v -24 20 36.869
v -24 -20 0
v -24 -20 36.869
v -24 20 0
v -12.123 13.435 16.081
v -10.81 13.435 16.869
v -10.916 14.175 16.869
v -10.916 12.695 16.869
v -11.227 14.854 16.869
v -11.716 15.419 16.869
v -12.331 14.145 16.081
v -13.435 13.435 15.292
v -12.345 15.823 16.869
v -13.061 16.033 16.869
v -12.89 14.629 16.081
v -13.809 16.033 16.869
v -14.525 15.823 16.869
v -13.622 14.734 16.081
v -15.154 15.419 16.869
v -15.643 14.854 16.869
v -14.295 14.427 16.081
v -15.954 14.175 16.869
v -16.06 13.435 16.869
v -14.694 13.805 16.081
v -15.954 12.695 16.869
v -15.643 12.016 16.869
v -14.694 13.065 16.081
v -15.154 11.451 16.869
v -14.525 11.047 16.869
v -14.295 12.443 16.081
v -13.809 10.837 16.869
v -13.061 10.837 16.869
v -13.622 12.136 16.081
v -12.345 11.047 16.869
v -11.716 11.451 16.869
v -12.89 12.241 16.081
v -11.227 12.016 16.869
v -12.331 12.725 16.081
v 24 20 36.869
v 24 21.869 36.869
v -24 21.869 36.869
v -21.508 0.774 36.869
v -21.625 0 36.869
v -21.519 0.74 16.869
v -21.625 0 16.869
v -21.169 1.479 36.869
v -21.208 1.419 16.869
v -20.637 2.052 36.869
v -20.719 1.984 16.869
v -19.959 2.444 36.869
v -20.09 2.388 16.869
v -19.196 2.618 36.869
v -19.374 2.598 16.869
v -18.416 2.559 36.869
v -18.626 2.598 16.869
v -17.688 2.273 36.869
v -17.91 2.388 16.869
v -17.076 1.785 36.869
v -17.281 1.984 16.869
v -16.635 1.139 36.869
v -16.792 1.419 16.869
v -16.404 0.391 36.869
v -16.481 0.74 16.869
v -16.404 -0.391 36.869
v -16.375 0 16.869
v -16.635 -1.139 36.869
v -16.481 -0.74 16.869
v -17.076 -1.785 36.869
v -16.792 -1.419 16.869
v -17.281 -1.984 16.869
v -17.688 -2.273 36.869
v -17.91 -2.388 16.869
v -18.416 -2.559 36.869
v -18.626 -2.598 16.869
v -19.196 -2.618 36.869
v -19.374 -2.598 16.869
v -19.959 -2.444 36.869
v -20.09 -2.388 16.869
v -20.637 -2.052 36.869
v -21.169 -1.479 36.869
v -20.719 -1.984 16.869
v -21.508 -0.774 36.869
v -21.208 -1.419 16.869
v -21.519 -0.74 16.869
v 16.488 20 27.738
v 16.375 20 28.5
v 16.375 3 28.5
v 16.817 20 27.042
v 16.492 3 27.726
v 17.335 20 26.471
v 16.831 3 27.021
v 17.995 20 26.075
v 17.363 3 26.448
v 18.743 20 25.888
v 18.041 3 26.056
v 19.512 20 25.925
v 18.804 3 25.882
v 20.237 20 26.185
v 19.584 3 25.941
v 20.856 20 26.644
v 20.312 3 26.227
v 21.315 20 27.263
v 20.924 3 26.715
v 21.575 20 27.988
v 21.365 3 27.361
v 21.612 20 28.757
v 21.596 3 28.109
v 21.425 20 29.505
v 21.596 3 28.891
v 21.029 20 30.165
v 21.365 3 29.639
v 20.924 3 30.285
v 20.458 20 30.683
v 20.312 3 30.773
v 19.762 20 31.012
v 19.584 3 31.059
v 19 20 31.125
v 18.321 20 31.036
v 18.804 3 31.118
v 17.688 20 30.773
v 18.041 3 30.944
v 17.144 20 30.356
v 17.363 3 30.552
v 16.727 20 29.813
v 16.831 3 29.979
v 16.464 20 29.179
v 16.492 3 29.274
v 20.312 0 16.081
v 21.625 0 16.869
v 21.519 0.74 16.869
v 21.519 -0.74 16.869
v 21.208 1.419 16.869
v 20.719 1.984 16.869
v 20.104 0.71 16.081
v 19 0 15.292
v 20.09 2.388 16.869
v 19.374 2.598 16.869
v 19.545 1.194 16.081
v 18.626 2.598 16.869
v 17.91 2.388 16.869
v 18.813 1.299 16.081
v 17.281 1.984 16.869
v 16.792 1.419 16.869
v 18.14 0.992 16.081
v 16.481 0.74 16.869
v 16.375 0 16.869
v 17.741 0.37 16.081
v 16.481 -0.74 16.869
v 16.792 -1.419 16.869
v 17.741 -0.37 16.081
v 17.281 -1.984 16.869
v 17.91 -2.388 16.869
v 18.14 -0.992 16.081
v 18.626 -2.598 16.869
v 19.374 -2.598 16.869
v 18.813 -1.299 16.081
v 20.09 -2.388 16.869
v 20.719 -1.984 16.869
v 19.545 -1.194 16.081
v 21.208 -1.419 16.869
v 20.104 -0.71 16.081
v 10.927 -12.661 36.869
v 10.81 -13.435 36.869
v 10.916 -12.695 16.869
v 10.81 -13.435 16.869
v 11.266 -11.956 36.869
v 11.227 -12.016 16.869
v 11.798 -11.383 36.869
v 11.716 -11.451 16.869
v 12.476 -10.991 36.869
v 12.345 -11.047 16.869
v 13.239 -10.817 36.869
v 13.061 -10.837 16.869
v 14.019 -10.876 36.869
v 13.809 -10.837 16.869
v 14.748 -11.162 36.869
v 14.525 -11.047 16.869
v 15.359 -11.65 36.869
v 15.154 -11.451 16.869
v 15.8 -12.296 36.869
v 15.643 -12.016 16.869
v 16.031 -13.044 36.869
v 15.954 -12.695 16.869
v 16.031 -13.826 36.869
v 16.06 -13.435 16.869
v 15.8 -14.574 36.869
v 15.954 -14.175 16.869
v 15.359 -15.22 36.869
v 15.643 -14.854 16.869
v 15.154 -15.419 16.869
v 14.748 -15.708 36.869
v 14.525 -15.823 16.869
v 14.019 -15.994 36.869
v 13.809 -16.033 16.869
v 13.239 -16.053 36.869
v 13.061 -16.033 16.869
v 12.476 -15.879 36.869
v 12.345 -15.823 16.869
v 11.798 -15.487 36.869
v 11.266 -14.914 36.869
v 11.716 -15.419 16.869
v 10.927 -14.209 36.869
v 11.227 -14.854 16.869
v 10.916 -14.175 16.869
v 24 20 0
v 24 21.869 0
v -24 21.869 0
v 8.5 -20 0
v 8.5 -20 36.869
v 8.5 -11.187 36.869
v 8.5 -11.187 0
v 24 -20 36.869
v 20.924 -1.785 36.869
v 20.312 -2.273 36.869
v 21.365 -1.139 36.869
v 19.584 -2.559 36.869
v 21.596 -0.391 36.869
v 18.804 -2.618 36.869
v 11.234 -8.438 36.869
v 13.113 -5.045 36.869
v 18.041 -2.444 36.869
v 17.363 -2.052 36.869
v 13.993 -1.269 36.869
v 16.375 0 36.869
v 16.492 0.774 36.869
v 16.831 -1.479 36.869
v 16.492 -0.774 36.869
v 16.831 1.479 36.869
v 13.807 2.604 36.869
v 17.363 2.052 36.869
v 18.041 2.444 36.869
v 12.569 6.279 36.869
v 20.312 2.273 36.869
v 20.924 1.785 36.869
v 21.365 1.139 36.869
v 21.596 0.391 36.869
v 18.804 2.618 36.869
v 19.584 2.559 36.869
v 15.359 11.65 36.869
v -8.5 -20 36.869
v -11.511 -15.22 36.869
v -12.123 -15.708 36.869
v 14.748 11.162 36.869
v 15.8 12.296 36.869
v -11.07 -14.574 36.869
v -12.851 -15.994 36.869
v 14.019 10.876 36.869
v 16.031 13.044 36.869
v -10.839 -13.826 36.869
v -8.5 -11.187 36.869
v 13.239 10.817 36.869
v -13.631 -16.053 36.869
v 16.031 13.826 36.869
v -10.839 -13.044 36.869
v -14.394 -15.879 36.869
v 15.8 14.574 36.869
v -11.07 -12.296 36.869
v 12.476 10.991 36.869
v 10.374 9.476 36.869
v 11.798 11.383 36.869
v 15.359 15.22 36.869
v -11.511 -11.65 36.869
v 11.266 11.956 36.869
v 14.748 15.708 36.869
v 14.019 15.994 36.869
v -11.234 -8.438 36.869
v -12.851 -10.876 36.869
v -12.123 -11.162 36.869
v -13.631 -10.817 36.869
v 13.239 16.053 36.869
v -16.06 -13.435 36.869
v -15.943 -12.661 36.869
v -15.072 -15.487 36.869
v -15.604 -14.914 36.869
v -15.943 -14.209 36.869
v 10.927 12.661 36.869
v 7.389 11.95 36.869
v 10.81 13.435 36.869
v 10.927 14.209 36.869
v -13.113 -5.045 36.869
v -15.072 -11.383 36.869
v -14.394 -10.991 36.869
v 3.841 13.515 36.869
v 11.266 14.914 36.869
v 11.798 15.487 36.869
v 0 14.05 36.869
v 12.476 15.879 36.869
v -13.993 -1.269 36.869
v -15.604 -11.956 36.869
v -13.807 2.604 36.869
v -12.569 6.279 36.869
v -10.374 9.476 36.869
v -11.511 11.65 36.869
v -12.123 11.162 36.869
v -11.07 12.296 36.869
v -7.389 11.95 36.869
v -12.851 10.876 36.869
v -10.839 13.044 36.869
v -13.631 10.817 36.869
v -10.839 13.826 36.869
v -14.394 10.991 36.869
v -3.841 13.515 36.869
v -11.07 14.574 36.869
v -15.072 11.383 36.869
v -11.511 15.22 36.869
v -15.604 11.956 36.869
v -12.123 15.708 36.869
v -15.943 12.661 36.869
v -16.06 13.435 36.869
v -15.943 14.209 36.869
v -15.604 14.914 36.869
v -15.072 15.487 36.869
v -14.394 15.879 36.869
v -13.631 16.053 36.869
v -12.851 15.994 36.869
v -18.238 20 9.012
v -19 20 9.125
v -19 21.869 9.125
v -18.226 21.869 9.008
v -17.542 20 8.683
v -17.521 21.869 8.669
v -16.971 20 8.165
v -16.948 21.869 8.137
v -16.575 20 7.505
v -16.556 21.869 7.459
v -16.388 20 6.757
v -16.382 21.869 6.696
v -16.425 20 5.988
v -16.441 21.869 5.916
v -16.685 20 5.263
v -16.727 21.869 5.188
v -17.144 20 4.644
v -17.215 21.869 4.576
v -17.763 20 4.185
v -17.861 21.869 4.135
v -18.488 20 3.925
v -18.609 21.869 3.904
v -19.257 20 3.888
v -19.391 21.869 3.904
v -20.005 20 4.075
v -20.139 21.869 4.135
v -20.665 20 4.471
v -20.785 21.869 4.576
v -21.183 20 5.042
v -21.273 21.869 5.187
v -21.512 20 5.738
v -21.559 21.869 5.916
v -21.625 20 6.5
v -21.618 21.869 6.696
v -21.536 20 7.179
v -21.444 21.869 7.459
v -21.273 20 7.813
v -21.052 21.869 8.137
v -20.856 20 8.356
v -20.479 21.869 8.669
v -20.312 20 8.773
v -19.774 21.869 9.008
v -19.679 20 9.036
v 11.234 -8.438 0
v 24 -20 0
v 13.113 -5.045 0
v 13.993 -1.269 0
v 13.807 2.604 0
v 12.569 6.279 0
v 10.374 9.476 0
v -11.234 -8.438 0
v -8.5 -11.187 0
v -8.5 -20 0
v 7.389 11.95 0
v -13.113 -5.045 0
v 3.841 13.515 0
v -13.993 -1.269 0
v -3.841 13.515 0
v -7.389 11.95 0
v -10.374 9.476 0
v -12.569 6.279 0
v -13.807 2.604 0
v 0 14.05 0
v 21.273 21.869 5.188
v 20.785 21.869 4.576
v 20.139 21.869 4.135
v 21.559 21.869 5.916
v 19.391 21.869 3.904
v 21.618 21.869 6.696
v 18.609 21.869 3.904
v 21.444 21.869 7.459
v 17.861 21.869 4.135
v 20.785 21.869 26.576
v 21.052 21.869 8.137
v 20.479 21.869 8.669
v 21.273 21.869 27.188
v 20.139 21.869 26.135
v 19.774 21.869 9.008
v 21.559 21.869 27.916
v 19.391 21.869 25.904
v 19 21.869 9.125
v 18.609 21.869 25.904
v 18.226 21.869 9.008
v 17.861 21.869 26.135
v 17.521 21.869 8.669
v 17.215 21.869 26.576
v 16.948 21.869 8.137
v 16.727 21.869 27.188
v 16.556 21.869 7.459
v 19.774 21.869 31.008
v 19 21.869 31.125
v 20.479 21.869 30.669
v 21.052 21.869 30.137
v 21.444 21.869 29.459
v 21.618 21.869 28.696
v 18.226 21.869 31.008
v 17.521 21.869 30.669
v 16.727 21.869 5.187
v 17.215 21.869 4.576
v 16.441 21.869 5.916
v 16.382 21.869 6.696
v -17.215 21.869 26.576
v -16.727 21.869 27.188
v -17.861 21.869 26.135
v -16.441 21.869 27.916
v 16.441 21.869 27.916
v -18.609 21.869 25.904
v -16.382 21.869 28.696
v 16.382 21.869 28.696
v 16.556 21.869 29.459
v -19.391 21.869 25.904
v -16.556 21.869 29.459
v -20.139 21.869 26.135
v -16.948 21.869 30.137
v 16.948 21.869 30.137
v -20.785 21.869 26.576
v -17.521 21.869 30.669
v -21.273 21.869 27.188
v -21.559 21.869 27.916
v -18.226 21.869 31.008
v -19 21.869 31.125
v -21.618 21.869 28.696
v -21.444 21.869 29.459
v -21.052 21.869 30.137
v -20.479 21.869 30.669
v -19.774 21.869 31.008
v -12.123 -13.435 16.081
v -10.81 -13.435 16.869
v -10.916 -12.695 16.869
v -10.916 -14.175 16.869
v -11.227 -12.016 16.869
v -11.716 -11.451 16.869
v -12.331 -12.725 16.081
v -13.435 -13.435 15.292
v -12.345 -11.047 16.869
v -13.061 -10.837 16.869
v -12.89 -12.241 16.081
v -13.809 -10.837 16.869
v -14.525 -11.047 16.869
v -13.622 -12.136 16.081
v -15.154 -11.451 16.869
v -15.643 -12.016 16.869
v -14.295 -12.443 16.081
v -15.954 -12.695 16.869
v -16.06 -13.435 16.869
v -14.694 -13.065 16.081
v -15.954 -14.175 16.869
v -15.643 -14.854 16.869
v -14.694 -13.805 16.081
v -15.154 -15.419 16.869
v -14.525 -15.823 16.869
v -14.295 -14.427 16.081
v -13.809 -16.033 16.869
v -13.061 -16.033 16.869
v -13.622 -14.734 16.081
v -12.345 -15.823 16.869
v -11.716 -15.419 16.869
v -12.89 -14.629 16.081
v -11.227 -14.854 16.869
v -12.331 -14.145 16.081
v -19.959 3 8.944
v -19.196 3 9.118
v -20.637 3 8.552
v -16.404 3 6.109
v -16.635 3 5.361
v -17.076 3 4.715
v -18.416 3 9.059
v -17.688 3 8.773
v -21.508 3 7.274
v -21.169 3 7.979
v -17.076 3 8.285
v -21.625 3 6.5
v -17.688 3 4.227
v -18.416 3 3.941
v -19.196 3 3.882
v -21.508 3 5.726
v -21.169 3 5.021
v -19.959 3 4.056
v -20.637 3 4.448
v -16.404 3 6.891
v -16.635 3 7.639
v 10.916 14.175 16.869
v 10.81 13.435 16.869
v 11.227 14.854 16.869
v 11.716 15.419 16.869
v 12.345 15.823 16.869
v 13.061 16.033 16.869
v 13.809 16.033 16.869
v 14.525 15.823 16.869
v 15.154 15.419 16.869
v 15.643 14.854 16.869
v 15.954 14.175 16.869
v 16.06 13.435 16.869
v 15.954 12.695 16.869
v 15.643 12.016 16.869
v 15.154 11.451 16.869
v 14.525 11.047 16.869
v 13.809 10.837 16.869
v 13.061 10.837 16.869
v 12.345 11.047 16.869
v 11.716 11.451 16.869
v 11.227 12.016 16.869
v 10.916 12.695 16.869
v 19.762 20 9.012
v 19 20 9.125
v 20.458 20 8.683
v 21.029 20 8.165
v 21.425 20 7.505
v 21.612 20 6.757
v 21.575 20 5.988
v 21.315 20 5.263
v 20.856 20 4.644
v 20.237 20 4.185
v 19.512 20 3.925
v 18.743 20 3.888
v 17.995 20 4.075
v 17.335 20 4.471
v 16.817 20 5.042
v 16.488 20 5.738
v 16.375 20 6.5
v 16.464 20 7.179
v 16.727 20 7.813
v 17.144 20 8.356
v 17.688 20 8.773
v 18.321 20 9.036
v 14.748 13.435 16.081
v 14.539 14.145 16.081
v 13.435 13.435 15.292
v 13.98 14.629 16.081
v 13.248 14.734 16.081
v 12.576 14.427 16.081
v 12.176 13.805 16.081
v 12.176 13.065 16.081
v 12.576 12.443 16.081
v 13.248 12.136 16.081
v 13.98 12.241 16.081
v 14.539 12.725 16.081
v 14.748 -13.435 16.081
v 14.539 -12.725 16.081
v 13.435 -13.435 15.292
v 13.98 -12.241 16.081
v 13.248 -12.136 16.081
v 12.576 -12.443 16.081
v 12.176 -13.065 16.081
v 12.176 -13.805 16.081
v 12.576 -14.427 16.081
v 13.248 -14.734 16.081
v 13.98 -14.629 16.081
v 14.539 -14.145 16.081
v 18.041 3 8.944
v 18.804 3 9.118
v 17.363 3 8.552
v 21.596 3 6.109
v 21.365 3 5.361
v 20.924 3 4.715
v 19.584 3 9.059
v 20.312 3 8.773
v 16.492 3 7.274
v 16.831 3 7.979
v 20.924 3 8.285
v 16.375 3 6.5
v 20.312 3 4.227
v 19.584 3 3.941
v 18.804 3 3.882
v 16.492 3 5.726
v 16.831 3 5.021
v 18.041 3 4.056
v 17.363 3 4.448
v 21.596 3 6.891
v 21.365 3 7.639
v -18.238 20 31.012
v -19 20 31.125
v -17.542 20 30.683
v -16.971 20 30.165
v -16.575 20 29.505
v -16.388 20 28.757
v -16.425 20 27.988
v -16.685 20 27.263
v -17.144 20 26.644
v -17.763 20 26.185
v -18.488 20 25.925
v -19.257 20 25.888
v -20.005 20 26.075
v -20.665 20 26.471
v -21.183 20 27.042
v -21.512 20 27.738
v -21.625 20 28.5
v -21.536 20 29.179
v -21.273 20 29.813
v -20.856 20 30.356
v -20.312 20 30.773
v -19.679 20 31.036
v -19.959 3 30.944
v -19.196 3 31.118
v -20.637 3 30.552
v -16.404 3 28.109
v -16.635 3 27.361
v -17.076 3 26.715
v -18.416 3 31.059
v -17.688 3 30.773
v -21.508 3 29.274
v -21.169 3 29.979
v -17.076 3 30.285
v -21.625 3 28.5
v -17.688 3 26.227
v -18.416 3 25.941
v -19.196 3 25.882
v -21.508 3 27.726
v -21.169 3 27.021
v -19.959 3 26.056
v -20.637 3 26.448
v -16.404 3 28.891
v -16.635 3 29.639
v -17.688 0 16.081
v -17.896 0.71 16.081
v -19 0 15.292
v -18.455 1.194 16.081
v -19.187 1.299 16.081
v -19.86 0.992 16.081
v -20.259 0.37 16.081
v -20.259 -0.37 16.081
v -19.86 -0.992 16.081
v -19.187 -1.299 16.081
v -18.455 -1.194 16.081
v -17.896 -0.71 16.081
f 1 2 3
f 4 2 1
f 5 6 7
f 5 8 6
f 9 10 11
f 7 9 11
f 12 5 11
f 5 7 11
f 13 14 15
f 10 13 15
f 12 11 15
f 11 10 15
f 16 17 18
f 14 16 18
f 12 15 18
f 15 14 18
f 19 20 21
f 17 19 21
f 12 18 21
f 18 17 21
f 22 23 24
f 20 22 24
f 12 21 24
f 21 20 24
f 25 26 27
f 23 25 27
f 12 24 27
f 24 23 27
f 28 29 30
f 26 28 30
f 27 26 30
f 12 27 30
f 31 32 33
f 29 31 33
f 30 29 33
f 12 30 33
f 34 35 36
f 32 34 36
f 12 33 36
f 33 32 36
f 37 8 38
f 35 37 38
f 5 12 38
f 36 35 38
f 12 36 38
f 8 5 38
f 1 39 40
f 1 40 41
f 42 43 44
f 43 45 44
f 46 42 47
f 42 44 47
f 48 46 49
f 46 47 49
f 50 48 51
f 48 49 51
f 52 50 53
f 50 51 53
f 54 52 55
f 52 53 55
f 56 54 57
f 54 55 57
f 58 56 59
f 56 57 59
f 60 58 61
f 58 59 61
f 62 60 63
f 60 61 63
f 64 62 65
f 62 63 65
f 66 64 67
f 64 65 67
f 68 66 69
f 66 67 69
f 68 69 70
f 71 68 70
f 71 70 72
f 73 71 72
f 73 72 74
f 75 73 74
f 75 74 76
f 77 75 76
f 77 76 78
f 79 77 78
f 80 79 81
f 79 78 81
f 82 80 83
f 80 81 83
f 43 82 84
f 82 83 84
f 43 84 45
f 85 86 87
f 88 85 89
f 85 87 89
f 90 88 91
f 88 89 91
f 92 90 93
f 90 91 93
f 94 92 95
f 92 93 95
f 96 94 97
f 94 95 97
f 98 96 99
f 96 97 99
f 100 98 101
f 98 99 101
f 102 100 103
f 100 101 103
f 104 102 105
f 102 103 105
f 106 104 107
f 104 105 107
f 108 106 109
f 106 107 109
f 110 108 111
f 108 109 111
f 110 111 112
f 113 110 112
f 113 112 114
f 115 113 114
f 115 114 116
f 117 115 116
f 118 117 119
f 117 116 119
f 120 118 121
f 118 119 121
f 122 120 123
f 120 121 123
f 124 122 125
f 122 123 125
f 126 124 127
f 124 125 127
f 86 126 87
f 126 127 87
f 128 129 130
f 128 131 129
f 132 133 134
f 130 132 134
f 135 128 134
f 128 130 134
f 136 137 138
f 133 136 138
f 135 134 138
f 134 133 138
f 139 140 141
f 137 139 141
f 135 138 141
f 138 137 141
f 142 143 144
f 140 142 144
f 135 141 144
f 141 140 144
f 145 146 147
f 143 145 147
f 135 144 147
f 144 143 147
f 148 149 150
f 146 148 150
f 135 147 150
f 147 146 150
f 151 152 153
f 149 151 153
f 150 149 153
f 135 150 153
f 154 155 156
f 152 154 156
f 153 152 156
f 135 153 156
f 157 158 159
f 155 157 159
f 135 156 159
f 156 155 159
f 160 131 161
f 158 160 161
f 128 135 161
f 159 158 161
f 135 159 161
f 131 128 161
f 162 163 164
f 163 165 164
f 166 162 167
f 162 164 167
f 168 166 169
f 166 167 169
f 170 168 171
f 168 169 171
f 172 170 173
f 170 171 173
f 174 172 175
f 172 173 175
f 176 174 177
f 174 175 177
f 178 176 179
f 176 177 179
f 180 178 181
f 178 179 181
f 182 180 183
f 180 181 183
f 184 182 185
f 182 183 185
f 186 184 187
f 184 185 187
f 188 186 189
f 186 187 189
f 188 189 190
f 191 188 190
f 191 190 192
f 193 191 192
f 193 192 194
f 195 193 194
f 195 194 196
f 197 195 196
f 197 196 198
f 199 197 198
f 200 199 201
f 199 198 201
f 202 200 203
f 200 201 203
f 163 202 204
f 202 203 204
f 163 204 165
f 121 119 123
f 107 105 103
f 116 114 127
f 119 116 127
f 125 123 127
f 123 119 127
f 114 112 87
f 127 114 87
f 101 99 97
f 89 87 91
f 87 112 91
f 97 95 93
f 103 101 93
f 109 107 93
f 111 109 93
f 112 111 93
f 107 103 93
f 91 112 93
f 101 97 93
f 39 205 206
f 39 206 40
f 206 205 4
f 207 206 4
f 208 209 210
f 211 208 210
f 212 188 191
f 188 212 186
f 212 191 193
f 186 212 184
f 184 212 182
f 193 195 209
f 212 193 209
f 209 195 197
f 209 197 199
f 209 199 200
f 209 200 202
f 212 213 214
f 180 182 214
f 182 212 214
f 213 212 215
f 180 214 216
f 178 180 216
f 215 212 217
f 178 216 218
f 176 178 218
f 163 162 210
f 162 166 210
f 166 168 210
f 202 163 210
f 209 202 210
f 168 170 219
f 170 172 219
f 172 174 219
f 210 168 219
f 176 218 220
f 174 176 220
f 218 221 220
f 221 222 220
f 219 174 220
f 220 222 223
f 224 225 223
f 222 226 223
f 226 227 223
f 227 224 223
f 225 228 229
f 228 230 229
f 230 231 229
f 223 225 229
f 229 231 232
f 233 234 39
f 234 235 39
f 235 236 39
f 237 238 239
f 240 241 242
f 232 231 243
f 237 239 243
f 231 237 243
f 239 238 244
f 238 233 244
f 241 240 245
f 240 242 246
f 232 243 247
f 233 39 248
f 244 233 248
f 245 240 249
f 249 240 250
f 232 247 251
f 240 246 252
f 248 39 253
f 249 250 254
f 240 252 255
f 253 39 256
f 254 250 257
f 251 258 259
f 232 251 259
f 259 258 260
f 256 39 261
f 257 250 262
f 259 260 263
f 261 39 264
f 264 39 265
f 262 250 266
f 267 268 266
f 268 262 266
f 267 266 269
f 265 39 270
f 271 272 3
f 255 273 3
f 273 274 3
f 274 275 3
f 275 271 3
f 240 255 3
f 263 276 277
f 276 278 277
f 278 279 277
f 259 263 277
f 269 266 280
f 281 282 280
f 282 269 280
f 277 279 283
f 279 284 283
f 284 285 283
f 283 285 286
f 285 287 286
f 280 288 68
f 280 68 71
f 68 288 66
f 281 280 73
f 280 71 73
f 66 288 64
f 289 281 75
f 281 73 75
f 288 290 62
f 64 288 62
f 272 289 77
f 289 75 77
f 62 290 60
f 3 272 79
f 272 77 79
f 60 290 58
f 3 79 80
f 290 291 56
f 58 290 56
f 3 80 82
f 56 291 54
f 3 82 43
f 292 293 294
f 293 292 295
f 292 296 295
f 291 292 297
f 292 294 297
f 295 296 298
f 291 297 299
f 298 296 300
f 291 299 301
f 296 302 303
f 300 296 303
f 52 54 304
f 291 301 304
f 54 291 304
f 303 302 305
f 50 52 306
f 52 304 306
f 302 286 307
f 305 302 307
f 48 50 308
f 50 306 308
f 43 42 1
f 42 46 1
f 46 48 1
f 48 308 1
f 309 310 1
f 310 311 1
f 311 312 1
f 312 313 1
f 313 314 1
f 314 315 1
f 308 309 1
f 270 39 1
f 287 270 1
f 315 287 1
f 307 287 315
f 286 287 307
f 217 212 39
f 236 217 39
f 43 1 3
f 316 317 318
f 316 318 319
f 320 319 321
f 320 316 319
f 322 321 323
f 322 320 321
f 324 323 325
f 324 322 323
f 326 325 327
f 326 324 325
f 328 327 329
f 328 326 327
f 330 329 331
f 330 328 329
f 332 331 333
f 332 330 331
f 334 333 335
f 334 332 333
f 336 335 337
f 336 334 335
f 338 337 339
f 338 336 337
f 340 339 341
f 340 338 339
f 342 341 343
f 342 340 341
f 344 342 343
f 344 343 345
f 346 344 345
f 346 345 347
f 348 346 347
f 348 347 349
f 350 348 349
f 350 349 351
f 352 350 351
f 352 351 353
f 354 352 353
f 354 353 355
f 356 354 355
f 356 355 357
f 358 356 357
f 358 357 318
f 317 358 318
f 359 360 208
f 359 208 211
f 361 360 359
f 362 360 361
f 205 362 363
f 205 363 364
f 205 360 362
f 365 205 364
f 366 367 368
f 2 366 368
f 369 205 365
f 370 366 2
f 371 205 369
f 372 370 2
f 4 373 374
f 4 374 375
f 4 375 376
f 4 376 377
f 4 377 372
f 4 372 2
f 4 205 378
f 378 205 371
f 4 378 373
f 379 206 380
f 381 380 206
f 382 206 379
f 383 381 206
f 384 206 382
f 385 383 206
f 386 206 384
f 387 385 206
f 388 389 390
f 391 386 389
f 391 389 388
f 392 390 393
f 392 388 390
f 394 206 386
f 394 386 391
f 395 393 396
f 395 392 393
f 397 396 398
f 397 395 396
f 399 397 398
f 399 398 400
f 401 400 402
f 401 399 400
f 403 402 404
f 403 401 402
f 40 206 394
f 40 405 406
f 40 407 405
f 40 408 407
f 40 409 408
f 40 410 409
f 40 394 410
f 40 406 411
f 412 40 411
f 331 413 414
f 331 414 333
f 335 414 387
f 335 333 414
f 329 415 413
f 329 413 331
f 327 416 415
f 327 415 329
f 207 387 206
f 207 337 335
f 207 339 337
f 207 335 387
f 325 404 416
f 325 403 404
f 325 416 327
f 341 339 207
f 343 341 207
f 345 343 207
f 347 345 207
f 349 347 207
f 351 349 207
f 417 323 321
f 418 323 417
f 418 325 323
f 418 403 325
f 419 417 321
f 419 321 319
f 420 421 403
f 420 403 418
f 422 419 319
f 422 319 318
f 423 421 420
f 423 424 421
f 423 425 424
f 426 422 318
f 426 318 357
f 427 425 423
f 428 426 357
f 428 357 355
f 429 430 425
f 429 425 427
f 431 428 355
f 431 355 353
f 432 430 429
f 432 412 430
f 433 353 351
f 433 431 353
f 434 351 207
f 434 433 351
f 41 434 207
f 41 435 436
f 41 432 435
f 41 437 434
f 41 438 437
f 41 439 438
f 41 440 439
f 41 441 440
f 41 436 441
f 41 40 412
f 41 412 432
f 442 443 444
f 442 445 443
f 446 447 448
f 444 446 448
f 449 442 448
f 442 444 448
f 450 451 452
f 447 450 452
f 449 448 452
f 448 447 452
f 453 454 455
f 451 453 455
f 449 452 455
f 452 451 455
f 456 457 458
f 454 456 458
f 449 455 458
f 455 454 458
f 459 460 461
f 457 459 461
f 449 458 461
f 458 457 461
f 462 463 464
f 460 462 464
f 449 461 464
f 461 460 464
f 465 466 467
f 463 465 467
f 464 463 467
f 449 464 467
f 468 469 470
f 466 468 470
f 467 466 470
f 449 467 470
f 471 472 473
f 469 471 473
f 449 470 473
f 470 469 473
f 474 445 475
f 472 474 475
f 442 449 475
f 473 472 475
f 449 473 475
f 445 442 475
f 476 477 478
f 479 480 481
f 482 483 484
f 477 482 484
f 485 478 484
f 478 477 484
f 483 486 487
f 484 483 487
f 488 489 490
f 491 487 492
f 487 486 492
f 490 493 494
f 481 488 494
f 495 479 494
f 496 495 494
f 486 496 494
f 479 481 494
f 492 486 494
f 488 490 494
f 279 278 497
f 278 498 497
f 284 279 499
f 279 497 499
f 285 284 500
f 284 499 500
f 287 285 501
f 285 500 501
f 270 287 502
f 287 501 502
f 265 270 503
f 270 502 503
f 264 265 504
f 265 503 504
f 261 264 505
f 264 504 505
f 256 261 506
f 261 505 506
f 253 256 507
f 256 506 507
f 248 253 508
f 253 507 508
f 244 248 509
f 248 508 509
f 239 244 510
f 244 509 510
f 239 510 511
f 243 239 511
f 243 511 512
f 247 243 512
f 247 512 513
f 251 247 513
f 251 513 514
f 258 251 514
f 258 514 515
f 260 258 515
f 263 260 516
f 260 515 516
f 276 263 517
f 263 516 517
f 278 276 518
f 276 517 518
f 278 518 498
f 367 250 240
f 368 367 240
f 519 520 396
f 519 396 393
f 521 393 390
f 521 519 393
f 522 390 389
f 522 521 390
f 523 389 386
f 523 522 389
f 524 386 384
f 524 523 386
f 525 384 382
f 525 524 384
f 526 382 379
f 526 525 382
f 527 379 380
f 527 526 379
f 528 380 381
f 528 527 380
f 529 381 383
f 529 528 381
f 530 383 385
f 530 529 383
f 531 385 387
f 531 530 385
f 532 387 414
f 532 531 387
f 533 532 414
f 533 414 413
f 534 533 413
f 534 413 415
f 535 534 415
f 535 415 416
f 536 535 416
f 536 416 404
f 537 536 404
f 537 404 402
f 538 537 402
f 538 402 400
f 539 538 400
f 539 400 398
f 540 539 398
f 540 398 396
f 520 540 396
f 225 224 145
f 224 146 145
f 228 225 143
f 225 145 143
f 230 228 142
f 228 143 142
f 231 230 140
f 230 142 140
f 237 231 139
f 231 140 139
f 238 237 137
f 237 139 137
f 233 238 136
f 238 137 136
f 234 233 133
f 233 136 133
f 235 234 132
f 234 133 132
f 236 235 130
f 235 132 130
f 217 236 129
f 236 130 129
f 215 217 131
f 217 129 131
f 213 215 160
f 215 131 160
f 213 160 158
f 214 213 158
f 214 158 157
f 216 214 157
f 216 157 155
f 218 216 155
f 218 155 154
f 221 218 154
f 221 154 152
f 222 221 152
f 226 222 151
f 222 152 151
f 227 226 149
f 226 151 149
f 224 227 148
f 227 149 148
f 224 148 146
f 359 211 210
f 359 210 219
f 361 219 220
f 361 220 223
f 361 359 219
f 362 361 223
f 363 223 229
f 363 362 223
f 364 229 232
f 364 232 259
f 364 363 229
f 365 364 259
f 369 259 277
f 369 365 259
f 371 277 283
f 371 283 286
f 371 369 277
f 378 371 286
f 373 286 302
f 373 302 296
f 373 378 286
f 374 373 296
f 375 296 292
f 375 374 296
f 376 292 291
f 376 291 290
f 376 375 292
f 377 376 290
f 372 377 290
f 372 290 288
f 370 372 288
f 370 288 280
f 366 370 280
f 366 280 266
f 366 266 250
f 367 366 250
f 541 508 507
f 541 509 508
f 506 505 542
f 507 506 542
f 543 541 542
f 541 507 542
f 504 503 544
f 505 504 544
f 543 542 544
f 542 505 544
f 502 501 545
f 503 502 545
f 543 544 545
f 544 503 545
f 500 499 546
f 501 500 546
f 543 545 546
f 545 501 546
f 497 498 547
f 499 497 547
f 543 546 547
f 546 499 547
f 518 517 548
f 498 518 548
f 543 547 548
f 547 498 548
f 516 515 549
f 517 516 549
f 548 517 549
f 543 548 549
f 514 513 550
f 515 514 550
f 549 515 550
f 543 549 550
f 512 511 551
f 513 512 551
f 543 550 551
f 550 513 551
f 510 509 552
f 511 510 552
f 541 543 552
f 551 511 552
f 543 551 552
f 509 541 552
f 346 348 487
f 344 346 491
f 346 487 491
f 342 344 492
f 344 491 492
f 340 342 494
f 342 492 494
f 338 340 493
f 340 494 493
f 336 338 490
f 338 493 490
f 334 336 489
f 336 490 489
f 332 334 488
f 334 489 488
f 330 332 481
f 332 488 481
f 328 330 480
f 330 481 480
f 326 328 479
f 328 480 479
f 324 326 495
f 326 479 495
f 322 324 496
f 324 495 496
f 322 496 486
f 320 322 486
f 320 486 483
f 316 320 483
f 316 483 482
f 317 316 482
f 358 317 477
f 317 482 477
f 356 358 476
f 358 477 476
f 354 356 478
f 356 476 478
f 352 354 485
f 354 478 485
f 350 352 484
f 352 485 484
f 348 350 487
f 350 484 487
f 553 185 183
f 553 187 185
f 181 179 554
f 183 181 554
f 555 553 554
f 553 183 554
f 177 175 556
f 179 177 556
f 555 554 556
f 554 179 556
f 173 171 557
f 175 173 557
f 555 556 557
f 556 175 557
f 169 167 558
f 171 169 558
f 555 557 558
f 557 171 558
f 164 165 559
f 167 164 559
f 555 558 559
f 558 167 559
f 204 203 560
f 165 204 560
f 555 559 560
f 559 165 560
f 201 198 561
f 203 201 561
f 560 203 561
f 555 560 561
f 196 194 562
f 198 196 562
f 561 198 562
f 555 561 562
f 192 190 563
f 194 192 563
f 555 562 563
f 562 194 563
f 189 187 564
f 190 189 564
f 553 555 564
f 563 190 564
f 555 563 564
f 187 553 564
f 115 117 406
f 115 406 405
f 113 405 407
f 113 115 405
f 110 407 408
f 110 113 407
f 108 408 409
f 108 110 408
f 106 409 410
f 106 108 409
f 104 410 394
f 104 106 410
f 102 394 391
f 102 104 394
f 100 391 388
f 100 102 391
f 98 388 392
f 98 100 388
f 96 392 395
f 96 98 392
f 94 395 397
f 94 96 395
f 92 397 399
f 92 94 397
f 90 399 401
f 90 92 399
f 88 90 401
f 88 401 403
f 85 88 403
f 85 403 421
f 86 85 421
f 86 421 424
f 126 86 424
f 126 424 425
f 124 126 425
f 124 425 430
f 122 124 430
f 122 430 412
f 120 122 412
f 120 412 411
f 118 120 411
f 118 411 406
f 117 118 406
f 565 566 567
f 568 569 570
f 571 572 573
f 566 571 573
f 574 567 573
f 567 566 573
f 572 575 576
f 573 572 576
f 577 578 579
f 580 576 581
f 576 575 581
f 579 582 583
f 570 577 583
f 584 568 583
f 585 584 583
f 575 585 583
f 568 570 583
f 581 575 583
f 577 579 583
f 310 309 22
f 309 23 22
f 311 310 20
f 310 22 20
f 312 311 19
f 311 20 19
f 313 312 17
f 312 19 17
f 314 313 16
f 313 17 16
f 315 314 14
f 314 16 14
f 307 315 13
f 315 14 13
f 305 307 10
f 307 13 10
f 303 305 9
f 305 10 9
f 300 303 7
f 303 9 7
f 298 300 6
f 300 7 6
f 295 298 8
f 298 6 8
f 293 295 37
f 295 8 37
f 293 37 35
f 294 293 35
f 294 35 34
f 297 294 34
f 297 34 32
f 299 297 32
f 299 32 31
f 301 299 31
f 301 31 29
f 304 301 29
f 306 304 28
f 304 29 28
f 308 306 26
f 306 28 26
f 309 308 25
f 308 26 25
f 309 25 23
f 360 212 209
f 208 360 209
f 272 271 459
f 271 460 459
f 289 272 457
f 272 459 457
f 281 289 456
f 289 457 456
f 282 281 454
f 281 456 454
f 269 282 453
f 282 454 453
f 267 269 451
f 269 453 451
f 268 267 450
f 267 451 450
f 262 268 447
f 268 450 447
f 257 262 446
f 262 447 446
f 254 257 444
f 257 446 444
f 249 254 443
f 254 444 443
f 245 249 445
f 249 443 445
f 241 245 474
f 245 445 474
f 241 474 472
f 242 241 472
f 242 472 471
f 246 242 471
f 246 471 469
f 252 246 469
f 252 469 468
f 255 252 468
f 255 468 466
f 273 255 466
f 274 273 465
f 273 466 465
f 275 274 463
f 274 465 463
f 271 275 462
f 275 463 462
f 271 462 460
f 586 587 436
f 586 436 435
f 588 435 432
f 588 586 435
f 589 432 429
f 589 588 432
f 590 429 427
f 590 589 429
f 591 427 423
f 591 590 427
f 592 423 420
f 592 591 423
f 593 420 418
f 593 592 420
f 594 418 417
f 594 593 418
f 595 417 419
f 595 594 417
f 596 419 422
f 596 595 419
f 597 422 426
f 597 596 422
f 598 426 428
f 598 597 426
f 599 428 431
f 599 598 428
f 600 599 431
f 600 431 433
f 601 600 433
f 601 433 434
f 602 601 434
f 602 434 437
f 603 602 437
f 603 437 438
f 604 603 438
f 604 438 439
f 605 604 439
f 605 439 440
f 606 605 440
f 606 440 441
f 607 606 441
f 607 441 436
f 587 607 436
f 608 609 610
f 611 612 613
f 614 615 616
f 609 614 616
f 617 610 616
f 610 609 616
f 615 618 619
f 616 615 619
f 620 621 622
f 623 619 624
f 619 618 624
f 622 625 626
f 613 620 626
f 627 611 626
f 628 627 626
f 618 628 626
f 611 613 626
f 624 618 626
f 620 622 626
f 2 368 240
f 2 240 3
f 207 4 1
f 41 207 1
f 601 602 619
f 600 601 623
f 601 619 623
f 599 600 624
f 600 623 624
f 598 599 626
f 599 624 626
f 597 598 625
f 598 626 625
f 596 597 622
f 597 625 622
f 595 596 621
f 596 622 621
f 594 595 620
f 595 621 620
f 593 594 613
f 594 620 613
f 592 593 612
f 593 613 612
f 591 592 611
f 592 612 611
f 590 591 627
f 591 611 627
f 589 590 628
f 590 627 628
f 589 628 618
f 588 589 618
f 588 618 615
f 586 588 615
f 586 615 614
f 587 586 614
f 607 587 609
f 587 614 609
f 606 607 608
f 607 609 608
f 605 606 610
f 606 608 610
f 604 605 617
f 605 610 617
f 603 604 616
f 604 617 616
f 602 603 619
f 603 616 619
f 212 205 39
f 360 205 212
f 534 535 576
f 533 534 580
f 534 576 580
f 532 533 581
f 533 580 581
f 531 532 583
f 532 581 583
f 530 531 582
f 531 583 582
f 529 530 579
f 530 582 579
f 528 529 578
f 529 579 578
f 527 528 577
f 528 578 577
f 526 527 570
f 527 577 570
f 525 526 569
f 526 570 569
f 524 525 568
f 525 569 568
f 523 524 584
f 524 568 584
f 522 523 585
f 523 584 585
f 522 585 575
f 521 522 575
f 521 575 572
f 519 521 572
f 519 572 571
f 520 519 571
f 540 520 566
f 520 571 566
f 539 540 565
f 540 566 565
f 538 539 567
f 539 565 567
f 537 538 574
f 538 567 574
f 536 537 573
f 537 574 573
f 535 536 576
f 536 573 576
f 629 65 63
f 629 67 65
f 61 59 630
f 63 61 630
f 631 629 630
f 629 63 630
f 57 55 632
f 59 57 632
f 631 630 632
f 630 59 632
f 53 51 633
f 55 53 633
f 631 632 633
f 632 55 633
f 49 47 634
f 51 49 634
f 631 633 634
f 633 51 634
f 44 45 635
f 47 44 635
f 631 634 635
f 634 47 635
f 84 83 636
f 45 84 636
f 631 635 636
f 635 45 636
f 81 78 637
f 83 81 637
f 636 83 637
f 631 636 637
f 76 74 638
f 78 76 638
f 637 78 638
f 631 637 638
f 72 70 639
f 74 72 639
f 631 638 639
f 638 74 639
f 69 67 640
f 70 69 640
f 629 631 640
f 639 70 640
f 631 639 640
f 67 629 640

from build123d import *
from build123d.topology import SkipClean

# Parameters (mm, degrees)
EXTRUSION1_DEPTH = 36.869499995
THREAD6_D        = 5.25
THREAD6_DEPTH    = 20
THREAD6_TIP      = 1.577259125
THREAD10_D       = 5.25
THREAD10_DEPTH   = 17
SKETCH6_W        = 48
SKETCH6_H        = 36.869499995
SKETCH6_R        = 2.625
EXTRUSION2_DEPTH = 1.869499995


with BuildPart() as part:
    # Sketch1 → Extrusion1 (new body)
    with BuildSketch(Plane.XY):
        with BuildLine():
            Line((-24, 20), (24, 20))
            Line((24, 20), (24, -20))
            Line((24, -20), (8.5, -20))
            Line((8.5, -20), (8.5, -11.187157816))
            ThreePointArc((8.5, -11.187157816), (0, 14.05), (-8.5, -11.187157816))
            Line((-8.5, -11.187157816), (-8.5, -20))
            Line((-8.5, -20), (-24, -20))
            Line((-24, -20), (-24, 20))
        make_face()
    extrude(amount=EXTRUSION1_DEPTH)

    # Thread6
    with Locations(Plane.XY.offset(36.869499995)):
        with Locations((-19, 0), (-13.435028843, -13.435028843), (-13.435028843, 13.435028843), (13.435028843, 13.435028843), (19, 0), (13.435028843, -13.435028843)):
            Hole(THREAD6_D / 2, depth=THREAD6_DEPTH)
            with Locations((0, 0, -(THREAD6_DEPTH + THREAD6_TIP / 2))):  # 118° drill point
                Cone(0, THREAD6_D / 2, THREAD6_TIP, mode=Mode.SUBTRACT)

    # Thread10
    with Locations(Plane(origin=(0, 20, 0), x_dir=(1, 0, 0), z_dir=(0, 1, 0))):
        with Locations((-19, -6.5), (19, -6.5), (-19, -28.5), (19, -28.5)):
            Hole(THREAD10_D / 2, depth=THREAD10_DEPTH)

    # Sketch6 → Extrusion2 (add)
    with SkipClean():  # the faces are left unmerged after this step: merging them gives an invalid solid
        with BuildSketch(Plane(origin=(0, 20, 0), x_dir=(-1, 0, 0), z_dir=(0, 1, 0))):
            with Locations((0, 18.434749998)):
                Rectangle(SKETCH6_W, SKETCH6_H)
            with Locations(Location((19, 28.5, 0), (0, 0, 90))):
                Circle(SKETCH6_R, mode=Mode.SUBTRACT)
            with Locations(Location((19, 6.5, 0), (0, 0, 90))):
                Circle(SKETCH6_R, mode=Mode.SUBTRACT)
            with Locations(Location((-19, 6.5, 0), (0, 0, 90))):
                Circle(SKETCH6_R, mode=Mode.SUBTRACT)
            with Locations(Location((-19, 28.5, 0), (0, 0, 90))):
                Circle(SKETCH6_R, mode=Mode.SUBTRACT)
        extrude(amount=EXTRUSION2_DEPTH)


solid = part.part
